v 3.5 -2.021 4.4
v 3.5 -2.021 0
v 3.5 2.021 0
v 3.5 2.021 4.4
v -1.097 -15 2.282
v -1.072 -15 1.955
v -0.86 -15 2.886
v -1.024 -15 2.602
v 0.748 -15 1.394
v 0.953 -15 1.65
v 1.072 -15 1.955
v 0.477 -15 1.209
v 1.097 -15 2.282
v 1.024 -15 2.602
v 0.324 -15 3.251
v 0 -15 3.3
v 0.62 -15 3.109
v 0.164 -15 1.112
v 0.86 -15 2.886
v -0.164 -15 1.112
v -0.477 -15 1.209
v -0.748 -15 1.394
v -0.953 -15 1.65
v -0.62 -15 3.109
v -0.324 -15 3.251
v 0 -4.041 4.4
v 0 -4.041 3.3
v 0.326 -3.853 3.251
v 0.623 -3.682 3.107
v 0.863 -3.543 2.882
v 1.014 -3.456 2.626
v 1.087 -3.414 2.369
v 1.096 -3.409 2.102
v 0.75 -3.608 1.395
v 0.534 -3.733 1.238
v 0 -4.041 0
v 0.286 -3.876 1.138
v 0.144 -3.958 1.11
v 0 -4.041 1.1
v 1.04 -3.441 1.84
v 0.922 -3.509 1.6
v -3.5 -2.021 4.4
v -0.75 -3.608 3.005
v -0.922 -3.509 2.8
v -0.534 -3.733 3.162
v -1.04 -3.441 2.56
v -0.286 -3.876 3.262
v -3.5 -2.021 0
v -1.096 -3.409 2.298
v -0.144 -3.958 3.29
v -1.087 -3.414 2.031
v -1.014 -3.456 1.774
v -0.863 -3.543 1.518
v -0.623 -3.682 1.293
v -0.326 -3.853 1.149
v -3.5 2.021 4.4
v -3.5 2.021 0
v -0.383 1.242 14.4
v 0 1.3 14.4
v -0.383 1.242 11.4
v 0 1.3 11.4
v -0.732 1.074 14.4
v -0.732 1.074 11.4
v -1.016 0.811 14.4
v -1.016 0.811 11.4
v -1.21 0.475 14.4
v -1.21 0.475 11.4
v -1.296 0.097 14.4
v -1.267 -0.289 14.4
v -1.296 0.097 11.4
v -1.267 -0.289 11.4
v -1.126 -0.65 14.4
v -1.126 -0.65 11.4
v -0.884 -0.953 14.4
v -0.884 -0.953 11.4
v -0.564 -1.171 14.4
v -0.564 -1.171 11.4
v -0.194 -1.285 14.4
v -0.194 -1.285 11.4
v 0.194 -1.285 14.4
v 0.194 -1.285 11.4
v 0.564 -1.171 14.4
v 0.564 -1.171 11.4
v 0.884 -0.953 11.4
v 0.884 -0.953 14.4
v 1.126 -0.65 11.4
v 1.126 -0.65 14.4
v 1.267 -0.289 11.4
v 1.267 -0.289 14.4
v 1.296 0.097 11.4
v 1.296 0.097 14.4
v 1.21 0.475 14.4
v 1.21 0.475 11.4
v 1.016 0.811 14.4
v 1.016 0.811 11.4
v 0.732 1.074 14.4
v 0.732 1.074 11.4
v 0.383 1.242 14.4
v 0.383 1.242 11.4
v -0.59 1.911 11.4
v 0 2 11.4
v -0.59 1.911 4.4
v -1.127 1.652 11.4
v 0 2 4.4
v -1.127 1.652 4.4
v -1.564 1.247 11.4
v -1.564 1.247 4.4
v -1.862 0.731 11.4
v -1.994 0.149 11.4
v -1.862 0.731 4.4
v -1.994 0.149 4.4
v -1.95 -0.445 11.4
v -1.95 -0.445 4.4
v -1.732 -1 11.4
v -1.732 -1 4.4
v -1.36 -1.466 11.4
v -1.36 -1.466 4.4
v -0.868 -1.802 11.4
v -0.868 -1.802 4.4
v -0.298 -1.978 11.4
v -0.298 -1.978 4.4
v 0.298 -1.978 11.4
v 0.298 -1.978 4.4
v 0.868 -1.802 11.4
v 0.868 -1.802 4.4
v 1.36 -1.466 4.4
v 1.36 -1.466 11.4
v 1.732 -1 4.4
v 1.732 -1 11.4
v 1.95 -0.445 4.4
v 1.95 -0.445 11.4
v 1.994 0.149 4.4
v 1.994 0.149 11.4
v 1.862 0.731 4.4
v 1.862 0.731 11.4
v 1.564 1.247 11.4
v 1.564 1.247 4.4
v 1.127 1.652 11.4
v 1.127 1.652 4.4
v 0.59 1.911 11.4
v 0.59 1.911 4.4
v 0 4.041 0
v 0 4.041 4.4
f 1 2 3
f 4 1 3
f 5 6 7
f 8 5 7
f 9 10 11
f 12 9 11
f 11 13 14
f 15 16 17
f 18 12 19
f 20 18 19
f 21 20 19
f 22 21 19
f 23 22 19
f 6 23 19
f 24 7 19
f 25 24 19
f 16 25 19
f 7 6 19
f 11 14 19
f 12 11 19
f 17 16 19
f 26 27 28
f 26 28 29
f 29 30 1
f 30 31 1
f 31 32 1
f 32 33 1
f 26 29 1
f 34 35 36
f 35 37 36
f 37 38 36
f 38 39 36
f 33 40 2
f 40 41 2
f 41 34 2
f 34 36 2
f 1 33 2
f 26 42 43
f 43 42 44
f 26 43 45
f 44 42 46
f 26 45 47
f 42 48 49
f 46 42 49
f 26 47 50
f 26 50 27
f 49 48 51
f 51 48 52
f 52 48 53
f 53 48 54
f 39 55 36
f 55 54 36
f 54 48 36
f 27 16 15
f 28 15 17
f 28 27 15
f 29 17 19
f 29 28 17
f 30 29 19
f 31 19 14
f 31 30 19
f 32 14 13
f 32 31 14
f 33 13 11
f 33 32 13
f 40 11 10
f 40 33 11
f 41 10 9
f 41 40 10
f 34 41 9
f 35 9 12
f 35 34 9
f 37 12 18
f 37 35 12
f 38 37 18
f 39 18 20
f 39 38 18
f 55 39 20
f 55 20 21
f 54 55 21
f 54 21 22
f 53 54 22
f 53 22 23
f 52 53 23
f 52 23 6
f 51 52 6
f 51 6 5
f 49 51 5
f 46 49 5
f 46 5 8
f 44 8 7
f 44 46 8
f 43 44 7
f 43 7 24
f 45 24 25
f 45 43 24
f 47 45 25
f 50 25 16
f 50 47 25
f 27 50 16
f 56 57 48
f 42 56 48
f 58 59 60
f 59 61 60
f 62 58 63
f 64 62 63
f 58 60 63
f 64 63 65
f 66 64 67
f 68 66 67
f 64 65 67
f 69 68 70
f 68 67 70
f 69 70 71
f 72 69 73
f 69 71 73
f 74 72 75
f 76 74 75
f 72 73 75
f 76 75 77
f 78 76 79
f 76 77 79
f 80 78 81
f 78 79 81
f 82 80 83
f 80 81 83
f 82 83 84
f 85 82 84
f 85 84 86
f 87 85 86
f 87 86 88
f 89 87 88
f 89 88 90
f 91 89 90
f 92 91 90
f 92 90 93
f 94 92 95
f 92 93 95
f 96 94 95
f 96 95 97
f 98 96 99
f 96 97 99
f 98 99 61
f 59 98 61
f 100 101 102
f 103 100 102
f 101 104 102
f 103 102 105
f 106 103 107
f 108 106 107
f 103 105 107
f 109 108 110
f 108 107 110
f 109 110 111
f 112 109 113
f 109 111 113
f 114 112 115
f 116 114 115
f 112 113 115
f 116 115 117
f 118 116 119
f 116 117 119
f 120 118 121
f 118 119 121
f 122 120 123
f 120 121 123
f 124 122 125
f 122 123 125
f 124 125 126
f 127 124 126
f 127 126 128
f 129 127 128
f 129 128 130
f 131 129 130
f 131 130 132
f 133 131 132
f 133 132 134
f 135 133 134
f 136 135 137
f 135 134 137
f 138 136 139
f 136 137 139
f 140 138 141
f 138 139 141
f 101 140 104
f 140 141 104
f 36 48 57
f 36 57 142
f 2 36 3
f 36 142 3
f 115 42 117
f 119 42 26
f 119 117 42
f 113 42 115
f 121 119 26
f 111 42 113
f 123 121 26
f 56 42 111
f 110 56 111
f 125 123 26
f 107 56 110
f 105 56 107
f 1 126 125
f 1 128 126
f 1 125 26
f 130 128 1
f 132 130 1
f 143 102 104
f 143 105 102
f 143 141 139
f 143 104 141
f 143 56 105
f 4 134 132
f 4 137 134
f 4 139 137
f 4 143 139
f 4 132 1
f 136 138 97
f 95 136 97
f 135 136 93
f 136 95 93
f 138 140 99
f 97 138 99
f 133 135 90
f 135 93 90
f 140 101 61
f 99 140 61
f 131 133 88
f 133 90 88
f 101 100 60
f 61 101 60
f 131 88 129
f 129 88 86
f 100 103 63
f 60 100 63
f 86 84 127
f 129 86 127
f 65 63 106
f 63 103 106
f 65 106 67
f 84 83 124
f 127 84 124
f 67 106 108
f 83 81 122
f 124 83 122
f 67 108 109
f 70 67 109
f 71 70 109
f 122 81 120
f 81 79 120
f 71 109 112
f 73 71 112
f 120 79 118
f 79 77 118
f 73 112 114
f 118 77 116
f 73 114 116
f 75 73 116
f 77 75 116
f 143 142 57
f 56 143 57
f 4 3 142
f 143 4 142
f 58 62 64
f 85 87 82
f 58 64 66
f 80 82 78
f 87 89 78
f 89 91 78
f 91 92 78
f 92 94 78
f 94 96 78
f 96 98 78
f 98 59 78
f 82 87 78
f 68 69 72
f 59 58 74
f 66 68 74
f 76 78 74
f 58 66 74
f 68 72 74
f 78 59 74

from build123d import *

# Parameters (mm, degrees)
EXTRUDE1_DEPTH = 4.4
SKETCH3_R      = 1.1
EXTRUDE2_DEPTH = 15


with BuildPart() as part:
    # Sketch1 → Extrude1 (new body)
    with BuildSketch(Plane.XY):
        Polygon((3.5, -2.020725942), (3.5, 2.020725942), (0, 4.041451884), (-3.5, 2.020725942), (-3.5, -2.020725942), (0, -4.041451884), align=None)
    extrude(amount=EXTRUDE1_DEPTH)

    # Sketch2 → Revolve1 (revolve)
    with BuildSketch(Plane(origin=(0, 0, 0), x_dir=(0, 0, -1), z_dir=(1, 0, 0))):
        Polygon((-14.4, 0), (-14.4, 1.3), (-11.4, 1.3), (-11.4, 2), (-4.4, 2), (-4.4, 0), align=None)
    revolve(axis=Axis((0, 0, 4.4), (0, 0, 1)))

    # Sketch3 → Extrude2 (add)
    with BuildSketch(Plane(origin=(0, 0, 0), x_dir=(1, 0, 0), z_dir=(0, 1, 0))):
        with Locations(Location((0, -2.2, 0), (0, 0, 270))):
            Circle(SKETCH3_R)
    extrude(amount=-EXTRUDE2_DEPTH)


solid = part.part
